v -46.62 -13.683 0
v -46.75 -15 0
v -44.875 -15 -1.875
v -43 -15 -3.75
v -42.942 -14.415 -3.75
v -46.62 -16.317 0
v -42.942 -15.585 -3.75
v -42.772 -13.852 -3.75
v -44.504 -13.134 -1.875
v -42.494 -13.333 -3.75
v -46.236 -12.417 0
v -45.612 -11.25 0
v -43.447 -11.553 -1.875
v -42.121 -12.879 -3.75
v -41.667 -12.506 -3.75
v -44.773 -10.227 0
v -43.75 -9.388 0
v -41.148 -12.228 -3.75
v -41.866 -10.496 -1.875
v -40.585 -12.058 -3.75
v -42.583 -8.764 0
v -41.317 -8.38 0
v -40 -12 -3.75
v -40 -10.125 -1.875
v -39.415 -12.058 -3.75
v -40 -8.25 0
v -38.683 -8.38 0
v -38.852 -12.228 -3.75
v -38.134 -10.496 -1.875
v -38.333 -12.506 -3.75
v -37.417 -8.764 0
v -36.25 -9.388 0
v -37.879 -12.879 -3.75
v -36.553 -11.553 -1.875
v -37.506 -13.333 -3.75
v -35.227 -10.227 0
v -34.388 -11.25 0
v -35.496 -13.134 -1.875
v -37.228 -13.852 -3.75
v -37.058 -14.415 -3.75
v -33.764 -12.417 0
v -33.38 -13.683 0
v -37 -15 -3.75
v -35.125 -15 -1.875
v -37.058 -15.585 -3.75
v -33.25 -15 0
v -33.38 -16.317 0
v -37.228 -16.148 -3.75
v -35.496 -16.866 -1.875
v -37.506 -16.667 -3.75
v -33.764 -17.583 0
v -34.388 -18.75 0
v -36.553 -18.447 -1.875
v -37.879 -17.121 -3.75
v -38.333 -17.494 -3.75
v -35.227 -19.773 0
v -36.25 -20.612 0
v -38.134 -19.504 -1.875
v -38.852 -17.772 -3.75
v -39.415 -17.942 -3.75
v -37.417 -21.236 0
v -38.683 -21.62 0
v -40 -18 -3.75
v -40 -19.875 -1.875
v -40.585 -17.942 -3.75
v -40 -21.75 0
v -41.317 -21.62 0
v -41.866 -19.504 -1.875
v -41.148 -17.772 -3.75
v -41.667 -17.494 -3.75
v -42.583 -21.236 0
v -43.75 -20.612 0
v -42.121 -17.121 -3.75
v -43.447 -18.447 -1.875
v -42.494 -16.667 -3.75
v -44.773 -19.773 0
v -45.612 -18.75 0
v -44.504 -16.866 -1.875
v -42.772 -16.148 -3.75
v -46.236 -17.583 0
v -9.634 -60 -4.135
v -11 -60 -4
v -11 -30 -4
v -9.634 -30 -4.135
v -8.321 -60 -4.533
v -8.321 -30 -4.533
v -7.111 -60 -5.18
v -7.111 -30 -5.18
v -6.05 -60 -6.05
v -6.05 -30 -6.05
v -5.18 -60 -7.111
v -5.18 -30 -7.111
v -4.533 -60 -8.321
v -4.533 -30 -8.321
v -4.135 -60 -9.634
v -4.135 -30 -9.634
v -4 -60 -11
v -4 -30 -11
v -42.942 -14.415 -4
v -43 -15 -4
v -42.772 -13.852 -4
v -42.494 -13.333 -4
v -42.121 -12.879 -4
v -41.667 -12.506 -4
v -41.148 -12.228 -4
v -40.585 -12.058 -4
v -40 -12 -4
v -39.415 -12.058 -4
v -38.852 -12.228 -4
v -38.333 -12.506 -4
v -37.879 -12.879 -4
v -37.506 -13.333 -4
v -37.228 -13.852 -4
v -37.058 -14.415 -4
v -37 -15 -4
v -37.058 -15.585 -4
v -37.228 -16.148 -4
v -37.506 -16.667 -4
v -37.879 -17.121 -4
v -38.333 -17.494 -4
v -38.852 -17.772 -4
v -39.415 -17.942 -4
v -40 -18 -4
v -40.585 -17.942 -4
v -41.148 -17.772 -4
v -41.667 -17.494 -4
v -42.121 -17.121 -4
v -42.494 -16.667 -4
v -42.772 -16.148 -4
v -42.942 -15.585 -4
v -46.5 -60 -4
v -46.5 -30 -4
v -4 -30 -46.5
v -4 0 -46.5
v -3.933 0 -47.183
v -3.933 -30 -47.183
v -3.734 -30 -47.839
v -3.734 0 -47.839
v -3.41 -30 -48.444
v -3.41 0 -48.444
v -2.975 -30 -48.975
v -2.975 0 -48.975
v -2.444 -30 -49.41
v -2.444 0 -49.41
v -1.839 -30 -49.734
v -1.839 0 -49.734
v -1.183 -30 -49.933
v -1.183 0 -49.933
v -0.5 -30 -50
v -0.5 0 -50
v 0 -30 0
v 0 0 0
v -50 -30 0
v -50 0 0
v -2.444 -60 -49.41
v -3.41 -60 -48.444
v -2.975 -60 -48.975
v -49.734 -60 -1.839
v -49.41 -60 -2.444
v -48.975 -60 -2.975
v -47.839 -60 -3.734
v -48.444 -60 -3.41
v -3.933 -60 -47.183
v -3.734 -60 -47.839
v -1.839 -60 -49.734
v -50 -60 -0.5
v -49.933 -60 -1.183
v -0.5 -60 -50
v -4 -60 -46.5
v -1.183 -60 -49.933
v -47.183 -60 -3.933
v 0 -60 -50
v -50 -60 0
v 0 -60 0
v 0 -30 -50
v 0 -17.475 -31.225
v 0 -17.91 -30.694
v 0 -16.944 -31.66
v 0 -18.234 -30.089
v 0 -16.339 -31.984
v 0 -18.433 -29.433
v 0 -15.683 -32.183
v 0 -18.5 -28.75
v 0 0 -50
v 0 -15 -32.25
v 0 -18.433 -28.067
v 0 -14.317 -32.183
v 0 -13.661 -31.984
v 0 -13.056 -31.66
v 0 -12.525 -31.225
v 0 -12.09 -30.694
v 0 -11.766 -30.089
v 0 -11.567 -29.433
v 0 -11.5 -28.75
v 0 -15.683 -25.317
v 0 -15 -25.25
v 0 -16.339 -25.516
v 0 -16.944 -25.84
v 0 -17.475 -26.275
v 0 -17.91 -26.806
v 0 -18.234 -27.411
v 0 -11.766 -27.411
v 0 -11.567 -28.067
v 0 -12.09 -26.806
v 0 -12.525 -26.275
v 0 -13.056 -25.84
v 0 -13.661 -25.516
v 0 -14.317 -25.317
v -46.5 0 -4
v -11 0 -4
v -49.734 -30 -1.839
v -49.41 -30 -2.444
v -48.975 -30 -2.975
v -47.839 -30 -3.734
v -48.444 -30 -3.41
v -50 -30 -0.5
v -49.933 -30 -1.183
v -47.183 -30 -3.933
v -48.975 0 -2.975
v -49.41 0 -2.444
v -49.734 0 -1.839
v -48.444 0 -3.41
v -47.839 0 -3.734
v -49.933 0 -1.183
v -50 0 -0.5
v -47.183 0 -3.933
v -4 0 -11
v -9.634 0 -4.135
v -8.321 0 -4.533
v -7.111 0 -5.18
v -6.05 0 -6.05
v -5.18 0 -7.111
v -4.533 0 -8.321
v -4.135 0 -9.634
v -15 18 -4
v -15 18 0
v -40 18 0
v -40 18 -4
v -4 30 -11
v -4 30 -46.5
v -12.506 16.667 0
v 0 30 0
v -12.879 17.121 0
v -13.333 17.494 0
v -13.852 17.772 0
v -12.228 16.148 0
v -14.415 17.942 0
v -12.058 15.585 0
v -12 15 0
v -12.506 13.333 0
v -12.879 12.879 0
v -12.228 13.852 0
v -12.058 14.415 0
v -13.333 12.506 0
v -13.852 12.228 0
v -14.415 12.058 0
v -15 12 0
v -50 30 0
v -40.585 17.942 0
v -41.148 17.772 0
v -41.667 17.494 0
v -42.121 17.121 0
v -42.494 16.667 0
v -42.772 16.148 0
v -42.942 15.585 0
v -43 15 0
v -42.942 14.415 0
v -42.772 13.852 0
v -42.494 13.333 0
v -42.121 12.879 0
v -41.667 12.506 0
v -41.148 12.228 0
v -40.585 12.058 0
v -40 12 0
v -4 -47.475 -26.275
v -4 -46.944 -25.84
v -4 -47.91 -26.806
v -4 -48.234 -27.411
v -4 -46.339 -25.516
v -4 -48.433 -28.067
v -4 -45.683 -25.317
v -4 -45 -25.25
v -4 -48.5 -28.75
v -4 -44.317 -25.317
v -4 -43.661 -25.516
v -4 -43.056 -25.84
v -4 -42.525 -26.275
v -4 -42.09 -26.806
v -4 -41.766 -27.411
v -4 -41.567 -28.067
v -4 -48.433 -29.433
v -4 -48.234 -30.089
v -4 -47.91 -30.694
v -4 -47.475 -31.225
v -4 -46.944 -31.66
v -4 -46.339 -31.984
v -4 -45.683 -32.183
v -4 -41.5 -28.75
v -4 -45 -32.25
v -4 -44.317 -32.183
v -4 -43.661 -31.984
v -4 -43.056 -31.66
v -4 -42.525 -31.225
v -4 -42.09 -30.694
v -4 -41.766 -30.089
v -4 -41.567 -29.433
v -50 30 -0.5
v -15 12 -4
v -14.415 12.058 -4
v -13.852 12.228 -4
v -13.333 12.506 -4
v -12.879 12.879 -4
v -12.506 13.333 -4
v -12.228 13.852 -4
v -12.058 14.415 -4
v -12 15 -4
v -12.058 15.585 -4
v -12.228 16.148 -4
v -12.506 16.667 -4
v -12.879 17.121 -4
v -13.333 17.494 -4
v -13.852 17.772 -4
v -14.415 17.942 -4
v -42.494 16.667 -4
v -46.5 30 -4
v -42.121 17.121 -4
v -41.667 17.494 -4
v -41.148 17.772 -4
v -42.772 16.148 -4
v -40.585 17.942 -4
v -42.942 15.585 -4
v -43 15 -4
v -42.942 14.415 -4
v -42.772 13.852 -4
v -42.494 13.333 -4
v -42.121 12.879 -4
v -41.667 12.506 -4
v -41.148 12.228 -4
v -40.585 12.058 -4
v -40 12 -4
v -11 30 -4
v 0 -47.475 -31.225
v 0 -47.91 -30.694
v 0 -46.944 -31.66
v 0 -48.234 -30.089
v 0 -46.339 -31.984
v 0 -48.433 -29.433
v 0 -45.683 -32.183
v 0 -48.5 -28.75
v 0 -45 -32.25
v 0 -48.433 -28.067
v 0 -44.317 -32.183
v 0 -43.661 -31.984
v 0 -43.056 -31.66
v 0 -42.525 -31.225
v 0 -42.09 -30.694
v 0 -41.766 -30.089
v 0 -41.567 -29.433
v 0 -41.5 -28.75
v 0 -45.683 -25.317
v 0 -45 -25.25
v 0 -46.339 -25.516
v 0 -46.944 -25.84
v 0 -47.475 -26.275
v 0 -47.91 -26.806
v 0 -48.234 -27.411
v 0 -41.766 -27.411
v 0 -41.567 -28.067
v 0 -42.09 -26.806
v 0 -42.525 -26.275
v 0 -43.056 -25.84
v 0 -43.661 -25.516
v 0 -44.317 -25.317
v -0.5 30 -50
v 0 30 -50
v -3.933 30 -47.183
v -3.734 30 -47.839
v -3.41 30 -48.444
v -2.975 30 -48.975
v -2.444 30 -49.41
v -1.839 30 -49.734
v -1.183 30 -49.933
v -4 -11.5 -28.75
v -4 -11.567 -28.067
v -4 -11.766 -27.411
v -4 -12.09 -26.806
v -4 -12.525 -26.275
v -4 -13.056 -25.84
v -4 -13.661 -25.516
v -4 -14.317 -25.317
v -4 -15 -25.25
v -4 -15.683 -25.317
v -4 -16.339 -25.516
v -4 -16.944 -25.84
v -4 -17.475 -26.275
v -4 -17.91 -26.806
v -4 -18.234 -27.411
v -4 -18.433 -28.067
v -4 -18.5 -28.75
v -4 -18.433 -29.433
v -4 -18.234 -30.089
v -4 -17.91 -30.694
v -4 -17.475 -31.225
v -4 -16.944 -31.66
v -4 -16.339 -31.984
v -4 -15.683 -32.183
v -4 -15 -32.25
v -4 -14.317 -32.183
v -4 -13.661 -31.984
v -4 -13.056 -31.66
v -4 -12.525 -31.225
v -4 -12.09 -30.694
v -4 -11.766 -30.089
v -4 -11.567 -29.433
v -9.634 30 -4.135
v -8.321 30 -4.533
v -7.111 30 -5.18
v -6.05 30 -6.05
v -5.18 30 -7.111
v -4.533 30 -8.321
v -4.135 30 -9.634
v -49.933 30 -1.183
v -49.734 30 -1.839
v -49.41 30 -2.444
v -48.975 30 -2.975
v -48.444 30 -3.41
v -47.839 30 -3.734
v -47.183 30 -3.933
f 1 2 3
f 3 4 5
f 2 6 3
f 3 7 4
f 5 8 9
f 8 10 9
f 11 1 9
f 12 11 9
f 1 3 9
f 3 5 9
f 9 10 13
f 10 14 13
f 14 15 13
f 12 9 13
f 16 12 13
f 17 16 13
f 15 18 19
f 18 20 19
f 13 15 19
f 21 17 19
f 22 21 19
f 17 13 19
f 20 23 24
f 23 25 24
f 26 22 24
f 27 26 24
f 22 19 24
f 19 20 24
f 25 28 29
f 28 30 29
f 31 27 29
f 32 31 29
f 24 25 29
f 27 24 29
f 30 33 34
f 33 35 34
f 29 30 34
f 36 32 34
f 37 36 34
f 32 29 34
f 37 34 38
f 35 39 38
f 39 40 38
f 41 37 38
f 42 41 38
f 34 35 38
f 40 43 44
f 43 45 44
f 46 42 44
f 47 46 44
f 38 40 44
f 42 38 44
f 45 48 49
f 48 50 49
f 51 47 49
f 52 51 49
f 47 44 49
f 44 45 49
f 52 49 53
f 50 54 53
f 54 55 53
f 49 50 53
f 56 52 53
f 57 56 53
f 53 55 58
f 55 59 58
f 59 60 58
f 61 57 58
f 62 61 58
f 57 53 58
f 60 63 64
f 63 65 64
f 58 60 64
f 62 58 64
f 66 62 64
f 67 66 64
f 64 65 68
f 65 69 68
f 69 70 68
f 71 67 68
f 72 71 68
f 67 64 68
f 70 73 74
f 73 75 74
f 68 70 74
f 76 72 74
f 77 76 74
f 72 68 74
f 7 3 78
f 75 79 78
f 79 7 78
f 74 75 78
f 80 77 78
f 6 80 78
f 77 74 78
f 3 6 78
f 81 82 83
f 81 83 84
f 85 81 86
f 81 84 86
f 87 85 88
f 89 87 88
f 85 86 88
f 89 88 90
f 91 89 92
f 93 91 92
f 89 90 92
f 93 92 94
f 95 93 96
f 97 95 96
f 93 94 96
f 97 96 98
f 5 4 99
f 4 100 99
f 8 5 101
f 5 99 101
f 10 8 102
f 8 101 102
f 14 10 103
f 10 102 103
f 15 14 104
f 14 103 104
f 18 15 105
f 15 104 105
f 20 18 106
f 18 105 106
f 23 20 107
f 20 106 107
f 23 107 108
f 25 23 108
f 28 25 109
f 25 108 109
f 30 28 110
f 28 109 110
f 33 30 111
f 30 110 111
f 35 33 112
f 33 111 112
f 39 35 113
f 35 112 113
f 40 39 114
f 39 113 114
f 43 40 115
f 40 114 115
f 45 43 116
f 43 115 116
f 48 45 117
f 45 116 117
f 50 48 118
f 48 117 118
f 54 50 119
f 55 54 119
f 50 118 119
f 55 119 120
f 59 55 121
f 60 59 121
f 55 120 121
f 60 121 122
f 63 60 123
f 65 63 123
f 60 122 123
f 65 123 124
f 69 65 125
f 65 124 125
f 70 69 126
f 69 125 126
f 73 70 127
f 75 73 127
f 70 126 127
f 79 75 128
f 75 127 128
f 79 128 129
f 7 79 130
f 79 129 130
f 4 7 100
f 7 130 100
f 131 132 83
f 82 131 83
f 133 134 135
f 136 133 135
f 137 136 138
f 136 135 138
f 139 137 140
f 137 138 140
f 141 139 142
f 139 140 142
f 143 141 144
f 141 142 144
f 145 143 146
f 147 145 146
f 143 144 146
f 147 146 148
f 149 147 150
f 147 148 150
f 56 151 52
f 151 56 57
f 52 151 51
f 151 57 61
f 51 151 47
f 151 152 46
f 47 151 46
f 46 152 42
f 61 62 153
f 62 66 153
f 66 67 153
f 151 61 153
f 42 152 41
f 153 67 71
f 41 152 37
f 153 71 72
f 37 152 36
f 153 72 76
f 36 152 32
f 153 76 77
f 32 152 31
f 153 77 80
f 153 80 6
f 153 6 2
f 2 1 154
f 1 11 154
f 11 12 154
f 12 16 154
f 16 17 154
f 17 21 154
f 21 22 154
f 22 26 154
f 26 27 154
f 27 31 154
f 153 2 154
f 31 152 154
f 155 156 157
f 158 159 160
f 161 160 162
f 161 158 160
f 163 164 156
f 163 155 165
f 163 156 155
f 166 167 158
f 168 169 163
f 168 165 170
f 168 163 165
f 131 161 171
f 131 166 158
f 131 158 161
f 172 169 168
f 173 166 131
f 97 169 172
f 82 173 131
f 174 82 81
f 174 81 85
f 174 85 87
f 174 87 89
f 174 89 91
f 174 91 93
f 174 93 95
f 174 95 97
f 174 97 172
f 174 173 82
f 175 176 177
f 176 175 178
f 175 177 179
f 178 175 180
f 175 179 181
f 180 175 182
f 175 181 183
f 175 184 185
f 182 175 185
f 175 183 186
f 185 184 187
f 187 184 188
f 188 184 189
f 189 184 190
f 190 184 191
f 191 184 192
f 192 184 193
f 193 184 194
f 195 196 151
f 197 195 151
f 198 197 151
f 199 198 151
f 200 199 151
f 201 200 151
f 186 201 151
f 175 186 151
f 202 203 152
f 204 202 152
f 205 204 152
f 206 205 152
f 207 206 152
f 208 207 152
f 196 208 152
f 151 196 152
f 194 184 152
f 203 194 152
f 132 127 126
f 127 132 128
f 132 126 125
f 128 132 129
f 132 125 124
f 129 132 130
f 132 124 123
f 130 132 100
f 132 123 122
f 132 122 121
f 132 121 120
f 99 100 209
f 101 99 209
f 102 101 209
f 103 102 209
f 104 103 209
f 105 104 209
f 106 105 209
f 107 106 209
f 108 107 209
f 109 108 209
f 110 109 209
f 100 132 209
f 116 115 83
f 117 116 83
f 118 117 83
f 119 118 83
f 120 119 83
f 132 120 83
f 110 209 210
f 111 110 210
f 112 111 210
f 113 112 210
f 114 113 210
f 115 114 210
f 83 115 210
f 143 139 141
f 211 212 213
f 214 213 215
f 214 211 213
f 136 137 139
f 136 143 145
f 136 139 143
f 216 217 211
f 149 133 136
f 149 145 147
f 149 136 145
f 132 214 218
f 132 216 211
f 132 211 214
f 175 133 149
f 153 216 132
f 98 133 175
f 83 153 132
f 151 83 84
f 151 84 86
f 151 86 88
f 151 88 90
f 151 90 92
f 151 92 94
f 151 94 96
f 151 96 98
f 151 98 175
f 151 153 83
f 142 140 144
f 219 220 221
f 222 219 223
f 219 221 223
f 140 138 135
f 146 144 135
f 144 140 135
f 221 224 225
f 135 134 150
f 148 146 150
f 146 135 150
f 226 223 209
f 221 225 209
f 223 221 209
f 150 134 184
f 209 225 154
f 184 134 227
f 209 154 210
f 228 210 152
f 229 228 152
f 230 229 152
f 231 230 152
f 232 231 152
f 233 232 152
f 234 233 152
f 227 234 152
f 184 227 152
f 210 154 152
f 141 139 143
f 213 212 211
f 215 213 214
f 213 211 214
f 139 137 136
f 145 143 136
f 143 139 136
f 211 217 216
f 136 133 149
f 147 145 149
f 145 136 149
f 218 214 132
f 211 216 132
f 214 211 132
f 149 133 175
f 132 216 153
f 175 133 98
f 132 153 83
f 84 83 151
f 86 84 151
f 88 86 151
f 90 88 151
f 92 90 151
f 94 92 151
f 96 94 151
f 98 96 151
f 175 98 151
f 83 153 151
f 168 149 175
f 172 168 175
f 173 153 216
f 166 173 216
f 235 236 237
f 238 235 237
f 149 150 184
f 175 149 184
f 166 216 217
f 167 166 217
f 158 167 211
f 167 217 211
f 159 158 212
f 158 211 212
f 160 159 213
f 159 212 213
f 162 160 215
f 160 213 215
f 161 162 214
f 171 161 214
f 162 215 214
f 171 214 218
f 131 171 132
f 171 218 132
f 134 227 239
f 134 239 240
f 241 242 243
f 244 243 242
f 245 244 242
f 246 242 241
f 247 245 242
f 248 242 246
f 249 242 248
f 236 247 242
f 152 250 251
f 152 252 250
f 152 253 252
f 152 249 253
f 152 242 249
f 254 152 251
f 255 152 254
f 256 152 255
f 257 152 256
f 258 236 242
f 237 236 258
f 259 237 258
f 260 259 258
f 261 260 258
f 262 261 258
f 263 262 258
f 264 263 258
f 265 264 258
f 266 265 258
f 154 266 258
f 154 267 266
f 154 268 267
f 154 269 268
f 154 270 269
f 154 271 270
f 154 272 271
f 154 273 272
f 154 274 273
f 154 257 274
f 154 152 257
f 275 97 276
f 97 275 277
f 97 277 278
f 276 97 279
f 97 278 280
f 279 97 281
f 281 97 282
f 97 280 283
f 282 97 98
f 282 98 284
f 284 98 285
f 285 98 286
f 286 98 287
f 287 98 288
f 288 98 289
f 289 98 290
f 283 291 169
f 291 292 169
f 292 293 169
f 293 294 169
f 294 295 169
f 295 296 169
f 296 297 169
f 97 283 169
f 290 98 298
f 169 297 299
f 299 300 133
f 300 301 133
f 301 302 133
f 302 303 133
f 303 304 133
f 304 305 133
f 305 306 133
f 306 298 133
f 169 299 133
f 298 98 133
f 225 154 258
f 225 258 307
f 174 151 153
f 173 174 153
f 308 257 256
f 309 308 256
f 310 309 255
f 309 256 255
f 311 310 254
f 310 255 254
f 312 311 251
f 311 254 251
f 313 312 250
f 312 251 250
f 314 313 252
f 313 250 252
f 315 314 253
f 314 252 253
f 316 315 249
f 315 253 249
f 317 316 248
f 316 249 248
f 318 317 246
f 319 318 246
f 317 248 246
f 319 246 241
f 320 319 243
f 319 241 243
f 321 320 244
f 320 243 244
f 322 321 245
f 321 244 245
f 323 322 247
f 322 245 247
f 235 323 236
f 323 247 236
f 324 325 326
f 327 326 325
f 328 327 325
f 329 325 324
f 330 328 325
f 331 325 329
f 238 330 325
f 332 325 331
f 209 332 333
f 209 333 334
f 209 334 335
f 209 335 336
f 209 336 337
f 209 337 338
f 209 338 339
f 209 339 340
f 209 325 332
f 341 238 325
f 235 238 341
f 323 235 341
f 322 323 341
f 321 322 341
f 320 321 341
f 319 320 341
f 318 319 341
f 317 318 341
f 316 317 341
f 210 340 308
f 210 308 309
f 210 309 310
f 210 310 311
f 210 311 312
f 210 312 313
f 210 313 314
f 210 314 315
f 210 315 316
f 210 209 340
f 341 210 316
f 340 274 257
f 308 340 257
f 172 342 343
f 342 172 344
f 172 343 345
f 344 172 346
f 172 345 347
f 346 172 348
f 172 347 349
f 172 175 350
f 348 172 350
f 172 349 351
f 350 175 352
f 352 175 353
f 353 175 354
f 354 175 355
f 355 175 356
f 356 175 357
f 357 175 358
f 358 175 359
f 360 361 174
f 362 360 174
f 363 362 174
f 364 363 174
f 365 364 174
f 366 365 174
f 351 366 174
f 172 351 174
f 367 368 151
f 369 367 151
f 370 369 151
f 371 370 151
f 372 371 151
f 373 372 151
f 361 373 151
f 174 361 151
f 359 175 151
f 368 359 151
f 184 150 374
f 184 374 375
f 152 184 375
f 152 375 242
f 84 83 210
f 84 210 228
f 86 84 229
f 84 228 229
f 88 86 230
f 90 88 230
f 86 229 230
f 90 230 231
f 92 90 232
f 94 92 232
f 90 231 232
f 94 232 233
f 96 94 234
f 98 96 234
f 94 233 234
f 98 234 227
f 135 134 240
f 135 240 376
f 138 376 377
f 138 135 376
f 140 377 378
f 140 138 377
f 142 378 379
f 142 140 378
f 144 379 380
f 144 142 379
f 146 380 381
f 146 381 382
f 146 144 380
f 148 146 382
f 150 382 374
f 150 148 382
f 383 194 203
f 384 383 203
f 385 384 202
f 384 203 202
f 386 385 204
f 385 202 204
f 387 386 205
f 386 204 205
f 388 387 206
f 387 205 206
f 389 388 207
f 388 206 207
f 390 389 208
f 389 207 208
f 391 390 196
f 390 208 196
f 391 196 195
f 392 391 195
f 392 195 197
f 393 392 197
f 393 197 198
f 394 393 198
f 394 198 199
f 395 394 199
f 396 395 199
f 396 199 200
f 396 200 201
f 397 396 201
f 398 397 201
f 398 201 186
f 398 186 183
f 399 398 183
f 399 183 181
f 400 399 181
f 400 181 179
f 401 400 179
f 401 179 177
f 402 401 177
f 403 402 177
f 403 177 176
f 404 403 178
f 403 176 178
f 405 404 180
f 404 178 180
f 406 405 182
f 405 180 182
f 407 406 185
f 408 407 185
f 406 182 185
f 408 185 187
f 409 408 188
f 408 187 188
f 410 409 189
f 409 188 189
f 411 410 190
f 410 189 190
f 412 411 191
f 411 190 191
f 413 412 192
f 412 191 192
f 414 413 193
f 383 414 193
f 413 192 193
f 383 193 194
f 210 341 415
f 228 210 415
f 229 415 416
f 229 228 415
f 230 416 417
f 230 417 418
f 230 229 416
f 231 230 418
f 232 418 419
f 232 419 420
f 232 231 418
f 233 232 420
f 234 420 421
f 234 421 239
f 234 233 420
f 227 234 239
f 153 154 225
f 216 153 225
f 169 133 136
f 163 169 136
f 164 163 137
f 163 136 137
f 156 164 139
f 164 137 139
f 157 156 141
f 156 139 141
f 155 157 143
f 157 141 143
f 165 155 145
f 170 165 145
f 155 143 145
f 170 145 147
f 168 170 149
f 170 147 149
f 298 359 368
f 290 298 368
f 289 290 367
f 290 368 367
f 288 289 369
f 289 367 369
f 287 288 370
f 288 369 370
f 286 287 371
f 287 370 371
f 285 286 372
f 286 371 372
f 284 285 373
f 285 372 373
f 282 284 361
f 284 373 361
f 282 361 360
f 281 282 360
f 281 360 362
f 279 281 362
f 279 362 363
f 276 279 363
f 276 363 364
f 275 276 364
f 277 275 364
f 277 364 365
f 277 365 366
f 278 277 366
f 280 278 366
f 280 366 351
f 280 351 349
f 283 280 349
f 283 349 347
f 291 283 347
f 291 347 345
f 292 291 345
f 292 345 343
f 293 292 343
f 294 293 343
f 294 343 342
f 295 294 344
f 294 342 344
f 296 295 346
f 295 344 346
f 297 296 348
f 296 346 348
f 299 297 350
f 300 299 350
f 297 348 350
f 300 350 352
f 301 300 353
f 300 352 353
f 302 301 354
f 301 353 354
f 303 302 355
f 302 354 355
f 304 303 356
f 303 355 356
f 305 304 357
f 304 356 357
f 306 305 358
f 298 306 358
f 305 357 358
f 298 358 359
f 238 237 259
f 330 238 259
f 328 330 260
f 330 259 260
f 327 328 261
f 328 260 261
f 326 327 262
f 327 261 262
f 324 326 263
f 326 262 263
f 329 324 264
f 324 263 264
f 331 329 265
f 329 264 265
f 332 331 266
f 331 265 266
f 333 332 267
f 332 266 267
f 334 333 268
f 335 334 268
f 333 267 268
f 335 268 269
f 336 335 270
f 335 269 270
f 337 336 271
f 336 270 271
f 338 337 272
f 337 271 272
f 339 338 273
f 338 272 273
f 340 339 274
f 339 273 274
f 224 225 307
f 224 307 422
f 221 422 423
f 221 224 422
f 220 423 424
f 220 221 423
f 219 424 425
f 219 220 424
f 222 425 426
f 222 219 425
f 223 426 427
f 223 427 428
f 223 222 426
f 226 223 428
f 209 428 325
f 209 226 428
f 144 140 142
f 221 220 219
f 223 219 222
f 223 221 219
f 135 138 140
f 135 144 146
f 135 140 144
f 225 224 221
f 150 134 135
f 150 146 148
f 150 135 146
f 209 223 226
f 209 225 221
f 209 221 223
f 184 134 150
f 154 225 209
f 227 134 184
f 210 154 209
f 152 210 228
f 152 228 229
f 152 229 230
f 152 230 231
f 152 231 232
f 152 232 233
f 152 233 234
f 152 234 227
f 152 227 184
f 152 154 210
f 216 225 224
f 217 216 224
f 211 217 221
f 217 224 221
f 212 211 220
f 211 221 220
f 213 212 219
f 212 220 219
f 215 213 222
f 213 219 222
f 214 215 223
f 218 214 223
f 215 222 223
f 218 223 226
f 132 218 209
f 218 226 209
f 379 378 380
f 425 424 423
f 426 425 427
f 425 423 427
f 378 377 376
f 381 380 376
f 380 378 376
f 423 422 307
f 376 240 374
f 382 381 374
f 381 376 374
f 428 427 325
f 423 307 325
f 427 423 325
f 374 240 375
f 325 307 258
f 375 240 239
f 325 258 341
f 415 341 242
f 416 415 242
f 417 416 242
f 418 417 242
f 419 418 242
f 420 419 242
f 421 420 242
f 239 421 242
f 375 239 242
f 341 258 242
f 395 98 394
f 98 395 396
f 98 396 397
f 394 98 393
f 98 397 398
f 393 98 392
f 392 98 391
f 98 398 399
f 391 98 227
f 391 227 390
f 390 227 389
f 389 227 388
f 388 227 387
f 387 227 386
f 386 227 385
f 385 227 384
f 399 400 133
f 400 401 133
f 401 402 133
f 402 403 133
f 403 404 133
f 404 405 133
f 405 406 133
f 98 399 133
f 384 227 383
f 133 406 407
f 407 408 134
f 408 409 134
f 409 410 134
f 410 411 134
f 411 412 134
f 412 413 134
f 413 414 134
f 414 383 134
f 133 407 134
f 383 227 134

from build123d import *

# Parameters (mm, degrees)
F1_DEPTH       = 30
F3_D           = 7
F5_D           = 6
F5_CSINK_D     = 13.5
F5_CSINK_ANGLE = 90
F6_DEPTH       = 30
F8_DEPTH       = 50.001
F9_DEPTH       = 30
F11_D          = 7


with BuildPart() as f1:
    # F0 (on Front) → F1 (new body)
    with BuildSketch(Plane.XZ):
        with BuildLine():
            Line((0, -50), (0, 0))
            Line((0, 0), (-50, 0))
            Line((-50, 0), (-50, -0.5))
            ThreePointArc((-50, -0.5), (-48.9748737342, -2.9748737342), (-46.5, -4))
            Line((-46.5, -4), (-11, -4))
            ThreePointArc((-11, -4), (-6.0502525317, -6.0502525317), (-4, -11))
            Line((-4, -11), (-4, -46.5))
            ThreePointArc((-4, -46.5), (-2.9748737342, -48.9748737342), (-0.5, -50))
            Line((-0.5, -50), (0, -50))
        make_face()
    extrude(amount=F1_DEPTH)

    # F3 (through all)
    with Locations(Plane(origin=(-4, 0, 0), x_dir=(0, -1, 0), z_dir=(-1, 0, 0))):
        with Locations((15, -28.75)):
            Hole(F3_D / 2)

    # F5 (through all)
    with Locations(Plane.XY):
        with Locations((-40, -15)):
            CounterSinkHole(F5_D / 2, F5_CSINK_D / 2, counter_sink_angle=F5_CSINK_ANGLE)


with BuildPart() as f6:
    # F0 (on Front) → F6 (new body)
    with BuildSketch(Plane.XZ):
        with BuildLine():
            Line((0, -50), (0, 0))
            Line((0, 0), (-50, 0))
            Line((-50, 0), (-50, -0.5))
            ThreePointArc((-50, -0.5), (-48.9748737342, -2.9748737342), (-46.5, -4))
            Line((-46.5, -4), (-11, -4))
            ThreePointArc((-11, -4), (-6.0502525317, -6.0502525317), (-4, -11))
            Line((-4, -11), (-4, -46.5))
            ThreePointArc((-4, -46.5), (-2.9748737342, -48.9748737342), (-0.5, -50))
            Line((-0.5, -50), (0, -50))
        make_face()
    extrude(amount=-F6_DEPTH)

    # F7 (on face) → F8 (cut, through all)
    with BuildSketch(Plane.XY):
        with BuildLine():
            ThreePointArc((-40, 18), (-43, 15), (-40, 12))
            Line((-40, 12), (-15, 12))
            ThreePointArc((-15, 12), (-12, 15), (-15, 18))
            Line((-15, 18), (-40, 18))
        make_face()
    extrude(amount=-F8_DEPTH, mode=Mode.SUBTRACT)


with BuildPart() as f9:
    # F9 (new): a face of the model
    f9_faces = [f1.part.faces().sort_by_distance(p)[0] for p in [
        (-0.25, -30, -49.2928932188),
    ]]
    extrude(f9_faces, amount=F9_DEPTH)

    # F11 (through all)
    with Locations(Plane(origin=(-4, 0, 0), x_dir=(0, -1, 0), z_dir=(-1, 0, 0))):
        with Locations((45, -28.75)):
            Hole(F11_D / 2)


solid = Compound([f1.part, f6.part, f9.part])
